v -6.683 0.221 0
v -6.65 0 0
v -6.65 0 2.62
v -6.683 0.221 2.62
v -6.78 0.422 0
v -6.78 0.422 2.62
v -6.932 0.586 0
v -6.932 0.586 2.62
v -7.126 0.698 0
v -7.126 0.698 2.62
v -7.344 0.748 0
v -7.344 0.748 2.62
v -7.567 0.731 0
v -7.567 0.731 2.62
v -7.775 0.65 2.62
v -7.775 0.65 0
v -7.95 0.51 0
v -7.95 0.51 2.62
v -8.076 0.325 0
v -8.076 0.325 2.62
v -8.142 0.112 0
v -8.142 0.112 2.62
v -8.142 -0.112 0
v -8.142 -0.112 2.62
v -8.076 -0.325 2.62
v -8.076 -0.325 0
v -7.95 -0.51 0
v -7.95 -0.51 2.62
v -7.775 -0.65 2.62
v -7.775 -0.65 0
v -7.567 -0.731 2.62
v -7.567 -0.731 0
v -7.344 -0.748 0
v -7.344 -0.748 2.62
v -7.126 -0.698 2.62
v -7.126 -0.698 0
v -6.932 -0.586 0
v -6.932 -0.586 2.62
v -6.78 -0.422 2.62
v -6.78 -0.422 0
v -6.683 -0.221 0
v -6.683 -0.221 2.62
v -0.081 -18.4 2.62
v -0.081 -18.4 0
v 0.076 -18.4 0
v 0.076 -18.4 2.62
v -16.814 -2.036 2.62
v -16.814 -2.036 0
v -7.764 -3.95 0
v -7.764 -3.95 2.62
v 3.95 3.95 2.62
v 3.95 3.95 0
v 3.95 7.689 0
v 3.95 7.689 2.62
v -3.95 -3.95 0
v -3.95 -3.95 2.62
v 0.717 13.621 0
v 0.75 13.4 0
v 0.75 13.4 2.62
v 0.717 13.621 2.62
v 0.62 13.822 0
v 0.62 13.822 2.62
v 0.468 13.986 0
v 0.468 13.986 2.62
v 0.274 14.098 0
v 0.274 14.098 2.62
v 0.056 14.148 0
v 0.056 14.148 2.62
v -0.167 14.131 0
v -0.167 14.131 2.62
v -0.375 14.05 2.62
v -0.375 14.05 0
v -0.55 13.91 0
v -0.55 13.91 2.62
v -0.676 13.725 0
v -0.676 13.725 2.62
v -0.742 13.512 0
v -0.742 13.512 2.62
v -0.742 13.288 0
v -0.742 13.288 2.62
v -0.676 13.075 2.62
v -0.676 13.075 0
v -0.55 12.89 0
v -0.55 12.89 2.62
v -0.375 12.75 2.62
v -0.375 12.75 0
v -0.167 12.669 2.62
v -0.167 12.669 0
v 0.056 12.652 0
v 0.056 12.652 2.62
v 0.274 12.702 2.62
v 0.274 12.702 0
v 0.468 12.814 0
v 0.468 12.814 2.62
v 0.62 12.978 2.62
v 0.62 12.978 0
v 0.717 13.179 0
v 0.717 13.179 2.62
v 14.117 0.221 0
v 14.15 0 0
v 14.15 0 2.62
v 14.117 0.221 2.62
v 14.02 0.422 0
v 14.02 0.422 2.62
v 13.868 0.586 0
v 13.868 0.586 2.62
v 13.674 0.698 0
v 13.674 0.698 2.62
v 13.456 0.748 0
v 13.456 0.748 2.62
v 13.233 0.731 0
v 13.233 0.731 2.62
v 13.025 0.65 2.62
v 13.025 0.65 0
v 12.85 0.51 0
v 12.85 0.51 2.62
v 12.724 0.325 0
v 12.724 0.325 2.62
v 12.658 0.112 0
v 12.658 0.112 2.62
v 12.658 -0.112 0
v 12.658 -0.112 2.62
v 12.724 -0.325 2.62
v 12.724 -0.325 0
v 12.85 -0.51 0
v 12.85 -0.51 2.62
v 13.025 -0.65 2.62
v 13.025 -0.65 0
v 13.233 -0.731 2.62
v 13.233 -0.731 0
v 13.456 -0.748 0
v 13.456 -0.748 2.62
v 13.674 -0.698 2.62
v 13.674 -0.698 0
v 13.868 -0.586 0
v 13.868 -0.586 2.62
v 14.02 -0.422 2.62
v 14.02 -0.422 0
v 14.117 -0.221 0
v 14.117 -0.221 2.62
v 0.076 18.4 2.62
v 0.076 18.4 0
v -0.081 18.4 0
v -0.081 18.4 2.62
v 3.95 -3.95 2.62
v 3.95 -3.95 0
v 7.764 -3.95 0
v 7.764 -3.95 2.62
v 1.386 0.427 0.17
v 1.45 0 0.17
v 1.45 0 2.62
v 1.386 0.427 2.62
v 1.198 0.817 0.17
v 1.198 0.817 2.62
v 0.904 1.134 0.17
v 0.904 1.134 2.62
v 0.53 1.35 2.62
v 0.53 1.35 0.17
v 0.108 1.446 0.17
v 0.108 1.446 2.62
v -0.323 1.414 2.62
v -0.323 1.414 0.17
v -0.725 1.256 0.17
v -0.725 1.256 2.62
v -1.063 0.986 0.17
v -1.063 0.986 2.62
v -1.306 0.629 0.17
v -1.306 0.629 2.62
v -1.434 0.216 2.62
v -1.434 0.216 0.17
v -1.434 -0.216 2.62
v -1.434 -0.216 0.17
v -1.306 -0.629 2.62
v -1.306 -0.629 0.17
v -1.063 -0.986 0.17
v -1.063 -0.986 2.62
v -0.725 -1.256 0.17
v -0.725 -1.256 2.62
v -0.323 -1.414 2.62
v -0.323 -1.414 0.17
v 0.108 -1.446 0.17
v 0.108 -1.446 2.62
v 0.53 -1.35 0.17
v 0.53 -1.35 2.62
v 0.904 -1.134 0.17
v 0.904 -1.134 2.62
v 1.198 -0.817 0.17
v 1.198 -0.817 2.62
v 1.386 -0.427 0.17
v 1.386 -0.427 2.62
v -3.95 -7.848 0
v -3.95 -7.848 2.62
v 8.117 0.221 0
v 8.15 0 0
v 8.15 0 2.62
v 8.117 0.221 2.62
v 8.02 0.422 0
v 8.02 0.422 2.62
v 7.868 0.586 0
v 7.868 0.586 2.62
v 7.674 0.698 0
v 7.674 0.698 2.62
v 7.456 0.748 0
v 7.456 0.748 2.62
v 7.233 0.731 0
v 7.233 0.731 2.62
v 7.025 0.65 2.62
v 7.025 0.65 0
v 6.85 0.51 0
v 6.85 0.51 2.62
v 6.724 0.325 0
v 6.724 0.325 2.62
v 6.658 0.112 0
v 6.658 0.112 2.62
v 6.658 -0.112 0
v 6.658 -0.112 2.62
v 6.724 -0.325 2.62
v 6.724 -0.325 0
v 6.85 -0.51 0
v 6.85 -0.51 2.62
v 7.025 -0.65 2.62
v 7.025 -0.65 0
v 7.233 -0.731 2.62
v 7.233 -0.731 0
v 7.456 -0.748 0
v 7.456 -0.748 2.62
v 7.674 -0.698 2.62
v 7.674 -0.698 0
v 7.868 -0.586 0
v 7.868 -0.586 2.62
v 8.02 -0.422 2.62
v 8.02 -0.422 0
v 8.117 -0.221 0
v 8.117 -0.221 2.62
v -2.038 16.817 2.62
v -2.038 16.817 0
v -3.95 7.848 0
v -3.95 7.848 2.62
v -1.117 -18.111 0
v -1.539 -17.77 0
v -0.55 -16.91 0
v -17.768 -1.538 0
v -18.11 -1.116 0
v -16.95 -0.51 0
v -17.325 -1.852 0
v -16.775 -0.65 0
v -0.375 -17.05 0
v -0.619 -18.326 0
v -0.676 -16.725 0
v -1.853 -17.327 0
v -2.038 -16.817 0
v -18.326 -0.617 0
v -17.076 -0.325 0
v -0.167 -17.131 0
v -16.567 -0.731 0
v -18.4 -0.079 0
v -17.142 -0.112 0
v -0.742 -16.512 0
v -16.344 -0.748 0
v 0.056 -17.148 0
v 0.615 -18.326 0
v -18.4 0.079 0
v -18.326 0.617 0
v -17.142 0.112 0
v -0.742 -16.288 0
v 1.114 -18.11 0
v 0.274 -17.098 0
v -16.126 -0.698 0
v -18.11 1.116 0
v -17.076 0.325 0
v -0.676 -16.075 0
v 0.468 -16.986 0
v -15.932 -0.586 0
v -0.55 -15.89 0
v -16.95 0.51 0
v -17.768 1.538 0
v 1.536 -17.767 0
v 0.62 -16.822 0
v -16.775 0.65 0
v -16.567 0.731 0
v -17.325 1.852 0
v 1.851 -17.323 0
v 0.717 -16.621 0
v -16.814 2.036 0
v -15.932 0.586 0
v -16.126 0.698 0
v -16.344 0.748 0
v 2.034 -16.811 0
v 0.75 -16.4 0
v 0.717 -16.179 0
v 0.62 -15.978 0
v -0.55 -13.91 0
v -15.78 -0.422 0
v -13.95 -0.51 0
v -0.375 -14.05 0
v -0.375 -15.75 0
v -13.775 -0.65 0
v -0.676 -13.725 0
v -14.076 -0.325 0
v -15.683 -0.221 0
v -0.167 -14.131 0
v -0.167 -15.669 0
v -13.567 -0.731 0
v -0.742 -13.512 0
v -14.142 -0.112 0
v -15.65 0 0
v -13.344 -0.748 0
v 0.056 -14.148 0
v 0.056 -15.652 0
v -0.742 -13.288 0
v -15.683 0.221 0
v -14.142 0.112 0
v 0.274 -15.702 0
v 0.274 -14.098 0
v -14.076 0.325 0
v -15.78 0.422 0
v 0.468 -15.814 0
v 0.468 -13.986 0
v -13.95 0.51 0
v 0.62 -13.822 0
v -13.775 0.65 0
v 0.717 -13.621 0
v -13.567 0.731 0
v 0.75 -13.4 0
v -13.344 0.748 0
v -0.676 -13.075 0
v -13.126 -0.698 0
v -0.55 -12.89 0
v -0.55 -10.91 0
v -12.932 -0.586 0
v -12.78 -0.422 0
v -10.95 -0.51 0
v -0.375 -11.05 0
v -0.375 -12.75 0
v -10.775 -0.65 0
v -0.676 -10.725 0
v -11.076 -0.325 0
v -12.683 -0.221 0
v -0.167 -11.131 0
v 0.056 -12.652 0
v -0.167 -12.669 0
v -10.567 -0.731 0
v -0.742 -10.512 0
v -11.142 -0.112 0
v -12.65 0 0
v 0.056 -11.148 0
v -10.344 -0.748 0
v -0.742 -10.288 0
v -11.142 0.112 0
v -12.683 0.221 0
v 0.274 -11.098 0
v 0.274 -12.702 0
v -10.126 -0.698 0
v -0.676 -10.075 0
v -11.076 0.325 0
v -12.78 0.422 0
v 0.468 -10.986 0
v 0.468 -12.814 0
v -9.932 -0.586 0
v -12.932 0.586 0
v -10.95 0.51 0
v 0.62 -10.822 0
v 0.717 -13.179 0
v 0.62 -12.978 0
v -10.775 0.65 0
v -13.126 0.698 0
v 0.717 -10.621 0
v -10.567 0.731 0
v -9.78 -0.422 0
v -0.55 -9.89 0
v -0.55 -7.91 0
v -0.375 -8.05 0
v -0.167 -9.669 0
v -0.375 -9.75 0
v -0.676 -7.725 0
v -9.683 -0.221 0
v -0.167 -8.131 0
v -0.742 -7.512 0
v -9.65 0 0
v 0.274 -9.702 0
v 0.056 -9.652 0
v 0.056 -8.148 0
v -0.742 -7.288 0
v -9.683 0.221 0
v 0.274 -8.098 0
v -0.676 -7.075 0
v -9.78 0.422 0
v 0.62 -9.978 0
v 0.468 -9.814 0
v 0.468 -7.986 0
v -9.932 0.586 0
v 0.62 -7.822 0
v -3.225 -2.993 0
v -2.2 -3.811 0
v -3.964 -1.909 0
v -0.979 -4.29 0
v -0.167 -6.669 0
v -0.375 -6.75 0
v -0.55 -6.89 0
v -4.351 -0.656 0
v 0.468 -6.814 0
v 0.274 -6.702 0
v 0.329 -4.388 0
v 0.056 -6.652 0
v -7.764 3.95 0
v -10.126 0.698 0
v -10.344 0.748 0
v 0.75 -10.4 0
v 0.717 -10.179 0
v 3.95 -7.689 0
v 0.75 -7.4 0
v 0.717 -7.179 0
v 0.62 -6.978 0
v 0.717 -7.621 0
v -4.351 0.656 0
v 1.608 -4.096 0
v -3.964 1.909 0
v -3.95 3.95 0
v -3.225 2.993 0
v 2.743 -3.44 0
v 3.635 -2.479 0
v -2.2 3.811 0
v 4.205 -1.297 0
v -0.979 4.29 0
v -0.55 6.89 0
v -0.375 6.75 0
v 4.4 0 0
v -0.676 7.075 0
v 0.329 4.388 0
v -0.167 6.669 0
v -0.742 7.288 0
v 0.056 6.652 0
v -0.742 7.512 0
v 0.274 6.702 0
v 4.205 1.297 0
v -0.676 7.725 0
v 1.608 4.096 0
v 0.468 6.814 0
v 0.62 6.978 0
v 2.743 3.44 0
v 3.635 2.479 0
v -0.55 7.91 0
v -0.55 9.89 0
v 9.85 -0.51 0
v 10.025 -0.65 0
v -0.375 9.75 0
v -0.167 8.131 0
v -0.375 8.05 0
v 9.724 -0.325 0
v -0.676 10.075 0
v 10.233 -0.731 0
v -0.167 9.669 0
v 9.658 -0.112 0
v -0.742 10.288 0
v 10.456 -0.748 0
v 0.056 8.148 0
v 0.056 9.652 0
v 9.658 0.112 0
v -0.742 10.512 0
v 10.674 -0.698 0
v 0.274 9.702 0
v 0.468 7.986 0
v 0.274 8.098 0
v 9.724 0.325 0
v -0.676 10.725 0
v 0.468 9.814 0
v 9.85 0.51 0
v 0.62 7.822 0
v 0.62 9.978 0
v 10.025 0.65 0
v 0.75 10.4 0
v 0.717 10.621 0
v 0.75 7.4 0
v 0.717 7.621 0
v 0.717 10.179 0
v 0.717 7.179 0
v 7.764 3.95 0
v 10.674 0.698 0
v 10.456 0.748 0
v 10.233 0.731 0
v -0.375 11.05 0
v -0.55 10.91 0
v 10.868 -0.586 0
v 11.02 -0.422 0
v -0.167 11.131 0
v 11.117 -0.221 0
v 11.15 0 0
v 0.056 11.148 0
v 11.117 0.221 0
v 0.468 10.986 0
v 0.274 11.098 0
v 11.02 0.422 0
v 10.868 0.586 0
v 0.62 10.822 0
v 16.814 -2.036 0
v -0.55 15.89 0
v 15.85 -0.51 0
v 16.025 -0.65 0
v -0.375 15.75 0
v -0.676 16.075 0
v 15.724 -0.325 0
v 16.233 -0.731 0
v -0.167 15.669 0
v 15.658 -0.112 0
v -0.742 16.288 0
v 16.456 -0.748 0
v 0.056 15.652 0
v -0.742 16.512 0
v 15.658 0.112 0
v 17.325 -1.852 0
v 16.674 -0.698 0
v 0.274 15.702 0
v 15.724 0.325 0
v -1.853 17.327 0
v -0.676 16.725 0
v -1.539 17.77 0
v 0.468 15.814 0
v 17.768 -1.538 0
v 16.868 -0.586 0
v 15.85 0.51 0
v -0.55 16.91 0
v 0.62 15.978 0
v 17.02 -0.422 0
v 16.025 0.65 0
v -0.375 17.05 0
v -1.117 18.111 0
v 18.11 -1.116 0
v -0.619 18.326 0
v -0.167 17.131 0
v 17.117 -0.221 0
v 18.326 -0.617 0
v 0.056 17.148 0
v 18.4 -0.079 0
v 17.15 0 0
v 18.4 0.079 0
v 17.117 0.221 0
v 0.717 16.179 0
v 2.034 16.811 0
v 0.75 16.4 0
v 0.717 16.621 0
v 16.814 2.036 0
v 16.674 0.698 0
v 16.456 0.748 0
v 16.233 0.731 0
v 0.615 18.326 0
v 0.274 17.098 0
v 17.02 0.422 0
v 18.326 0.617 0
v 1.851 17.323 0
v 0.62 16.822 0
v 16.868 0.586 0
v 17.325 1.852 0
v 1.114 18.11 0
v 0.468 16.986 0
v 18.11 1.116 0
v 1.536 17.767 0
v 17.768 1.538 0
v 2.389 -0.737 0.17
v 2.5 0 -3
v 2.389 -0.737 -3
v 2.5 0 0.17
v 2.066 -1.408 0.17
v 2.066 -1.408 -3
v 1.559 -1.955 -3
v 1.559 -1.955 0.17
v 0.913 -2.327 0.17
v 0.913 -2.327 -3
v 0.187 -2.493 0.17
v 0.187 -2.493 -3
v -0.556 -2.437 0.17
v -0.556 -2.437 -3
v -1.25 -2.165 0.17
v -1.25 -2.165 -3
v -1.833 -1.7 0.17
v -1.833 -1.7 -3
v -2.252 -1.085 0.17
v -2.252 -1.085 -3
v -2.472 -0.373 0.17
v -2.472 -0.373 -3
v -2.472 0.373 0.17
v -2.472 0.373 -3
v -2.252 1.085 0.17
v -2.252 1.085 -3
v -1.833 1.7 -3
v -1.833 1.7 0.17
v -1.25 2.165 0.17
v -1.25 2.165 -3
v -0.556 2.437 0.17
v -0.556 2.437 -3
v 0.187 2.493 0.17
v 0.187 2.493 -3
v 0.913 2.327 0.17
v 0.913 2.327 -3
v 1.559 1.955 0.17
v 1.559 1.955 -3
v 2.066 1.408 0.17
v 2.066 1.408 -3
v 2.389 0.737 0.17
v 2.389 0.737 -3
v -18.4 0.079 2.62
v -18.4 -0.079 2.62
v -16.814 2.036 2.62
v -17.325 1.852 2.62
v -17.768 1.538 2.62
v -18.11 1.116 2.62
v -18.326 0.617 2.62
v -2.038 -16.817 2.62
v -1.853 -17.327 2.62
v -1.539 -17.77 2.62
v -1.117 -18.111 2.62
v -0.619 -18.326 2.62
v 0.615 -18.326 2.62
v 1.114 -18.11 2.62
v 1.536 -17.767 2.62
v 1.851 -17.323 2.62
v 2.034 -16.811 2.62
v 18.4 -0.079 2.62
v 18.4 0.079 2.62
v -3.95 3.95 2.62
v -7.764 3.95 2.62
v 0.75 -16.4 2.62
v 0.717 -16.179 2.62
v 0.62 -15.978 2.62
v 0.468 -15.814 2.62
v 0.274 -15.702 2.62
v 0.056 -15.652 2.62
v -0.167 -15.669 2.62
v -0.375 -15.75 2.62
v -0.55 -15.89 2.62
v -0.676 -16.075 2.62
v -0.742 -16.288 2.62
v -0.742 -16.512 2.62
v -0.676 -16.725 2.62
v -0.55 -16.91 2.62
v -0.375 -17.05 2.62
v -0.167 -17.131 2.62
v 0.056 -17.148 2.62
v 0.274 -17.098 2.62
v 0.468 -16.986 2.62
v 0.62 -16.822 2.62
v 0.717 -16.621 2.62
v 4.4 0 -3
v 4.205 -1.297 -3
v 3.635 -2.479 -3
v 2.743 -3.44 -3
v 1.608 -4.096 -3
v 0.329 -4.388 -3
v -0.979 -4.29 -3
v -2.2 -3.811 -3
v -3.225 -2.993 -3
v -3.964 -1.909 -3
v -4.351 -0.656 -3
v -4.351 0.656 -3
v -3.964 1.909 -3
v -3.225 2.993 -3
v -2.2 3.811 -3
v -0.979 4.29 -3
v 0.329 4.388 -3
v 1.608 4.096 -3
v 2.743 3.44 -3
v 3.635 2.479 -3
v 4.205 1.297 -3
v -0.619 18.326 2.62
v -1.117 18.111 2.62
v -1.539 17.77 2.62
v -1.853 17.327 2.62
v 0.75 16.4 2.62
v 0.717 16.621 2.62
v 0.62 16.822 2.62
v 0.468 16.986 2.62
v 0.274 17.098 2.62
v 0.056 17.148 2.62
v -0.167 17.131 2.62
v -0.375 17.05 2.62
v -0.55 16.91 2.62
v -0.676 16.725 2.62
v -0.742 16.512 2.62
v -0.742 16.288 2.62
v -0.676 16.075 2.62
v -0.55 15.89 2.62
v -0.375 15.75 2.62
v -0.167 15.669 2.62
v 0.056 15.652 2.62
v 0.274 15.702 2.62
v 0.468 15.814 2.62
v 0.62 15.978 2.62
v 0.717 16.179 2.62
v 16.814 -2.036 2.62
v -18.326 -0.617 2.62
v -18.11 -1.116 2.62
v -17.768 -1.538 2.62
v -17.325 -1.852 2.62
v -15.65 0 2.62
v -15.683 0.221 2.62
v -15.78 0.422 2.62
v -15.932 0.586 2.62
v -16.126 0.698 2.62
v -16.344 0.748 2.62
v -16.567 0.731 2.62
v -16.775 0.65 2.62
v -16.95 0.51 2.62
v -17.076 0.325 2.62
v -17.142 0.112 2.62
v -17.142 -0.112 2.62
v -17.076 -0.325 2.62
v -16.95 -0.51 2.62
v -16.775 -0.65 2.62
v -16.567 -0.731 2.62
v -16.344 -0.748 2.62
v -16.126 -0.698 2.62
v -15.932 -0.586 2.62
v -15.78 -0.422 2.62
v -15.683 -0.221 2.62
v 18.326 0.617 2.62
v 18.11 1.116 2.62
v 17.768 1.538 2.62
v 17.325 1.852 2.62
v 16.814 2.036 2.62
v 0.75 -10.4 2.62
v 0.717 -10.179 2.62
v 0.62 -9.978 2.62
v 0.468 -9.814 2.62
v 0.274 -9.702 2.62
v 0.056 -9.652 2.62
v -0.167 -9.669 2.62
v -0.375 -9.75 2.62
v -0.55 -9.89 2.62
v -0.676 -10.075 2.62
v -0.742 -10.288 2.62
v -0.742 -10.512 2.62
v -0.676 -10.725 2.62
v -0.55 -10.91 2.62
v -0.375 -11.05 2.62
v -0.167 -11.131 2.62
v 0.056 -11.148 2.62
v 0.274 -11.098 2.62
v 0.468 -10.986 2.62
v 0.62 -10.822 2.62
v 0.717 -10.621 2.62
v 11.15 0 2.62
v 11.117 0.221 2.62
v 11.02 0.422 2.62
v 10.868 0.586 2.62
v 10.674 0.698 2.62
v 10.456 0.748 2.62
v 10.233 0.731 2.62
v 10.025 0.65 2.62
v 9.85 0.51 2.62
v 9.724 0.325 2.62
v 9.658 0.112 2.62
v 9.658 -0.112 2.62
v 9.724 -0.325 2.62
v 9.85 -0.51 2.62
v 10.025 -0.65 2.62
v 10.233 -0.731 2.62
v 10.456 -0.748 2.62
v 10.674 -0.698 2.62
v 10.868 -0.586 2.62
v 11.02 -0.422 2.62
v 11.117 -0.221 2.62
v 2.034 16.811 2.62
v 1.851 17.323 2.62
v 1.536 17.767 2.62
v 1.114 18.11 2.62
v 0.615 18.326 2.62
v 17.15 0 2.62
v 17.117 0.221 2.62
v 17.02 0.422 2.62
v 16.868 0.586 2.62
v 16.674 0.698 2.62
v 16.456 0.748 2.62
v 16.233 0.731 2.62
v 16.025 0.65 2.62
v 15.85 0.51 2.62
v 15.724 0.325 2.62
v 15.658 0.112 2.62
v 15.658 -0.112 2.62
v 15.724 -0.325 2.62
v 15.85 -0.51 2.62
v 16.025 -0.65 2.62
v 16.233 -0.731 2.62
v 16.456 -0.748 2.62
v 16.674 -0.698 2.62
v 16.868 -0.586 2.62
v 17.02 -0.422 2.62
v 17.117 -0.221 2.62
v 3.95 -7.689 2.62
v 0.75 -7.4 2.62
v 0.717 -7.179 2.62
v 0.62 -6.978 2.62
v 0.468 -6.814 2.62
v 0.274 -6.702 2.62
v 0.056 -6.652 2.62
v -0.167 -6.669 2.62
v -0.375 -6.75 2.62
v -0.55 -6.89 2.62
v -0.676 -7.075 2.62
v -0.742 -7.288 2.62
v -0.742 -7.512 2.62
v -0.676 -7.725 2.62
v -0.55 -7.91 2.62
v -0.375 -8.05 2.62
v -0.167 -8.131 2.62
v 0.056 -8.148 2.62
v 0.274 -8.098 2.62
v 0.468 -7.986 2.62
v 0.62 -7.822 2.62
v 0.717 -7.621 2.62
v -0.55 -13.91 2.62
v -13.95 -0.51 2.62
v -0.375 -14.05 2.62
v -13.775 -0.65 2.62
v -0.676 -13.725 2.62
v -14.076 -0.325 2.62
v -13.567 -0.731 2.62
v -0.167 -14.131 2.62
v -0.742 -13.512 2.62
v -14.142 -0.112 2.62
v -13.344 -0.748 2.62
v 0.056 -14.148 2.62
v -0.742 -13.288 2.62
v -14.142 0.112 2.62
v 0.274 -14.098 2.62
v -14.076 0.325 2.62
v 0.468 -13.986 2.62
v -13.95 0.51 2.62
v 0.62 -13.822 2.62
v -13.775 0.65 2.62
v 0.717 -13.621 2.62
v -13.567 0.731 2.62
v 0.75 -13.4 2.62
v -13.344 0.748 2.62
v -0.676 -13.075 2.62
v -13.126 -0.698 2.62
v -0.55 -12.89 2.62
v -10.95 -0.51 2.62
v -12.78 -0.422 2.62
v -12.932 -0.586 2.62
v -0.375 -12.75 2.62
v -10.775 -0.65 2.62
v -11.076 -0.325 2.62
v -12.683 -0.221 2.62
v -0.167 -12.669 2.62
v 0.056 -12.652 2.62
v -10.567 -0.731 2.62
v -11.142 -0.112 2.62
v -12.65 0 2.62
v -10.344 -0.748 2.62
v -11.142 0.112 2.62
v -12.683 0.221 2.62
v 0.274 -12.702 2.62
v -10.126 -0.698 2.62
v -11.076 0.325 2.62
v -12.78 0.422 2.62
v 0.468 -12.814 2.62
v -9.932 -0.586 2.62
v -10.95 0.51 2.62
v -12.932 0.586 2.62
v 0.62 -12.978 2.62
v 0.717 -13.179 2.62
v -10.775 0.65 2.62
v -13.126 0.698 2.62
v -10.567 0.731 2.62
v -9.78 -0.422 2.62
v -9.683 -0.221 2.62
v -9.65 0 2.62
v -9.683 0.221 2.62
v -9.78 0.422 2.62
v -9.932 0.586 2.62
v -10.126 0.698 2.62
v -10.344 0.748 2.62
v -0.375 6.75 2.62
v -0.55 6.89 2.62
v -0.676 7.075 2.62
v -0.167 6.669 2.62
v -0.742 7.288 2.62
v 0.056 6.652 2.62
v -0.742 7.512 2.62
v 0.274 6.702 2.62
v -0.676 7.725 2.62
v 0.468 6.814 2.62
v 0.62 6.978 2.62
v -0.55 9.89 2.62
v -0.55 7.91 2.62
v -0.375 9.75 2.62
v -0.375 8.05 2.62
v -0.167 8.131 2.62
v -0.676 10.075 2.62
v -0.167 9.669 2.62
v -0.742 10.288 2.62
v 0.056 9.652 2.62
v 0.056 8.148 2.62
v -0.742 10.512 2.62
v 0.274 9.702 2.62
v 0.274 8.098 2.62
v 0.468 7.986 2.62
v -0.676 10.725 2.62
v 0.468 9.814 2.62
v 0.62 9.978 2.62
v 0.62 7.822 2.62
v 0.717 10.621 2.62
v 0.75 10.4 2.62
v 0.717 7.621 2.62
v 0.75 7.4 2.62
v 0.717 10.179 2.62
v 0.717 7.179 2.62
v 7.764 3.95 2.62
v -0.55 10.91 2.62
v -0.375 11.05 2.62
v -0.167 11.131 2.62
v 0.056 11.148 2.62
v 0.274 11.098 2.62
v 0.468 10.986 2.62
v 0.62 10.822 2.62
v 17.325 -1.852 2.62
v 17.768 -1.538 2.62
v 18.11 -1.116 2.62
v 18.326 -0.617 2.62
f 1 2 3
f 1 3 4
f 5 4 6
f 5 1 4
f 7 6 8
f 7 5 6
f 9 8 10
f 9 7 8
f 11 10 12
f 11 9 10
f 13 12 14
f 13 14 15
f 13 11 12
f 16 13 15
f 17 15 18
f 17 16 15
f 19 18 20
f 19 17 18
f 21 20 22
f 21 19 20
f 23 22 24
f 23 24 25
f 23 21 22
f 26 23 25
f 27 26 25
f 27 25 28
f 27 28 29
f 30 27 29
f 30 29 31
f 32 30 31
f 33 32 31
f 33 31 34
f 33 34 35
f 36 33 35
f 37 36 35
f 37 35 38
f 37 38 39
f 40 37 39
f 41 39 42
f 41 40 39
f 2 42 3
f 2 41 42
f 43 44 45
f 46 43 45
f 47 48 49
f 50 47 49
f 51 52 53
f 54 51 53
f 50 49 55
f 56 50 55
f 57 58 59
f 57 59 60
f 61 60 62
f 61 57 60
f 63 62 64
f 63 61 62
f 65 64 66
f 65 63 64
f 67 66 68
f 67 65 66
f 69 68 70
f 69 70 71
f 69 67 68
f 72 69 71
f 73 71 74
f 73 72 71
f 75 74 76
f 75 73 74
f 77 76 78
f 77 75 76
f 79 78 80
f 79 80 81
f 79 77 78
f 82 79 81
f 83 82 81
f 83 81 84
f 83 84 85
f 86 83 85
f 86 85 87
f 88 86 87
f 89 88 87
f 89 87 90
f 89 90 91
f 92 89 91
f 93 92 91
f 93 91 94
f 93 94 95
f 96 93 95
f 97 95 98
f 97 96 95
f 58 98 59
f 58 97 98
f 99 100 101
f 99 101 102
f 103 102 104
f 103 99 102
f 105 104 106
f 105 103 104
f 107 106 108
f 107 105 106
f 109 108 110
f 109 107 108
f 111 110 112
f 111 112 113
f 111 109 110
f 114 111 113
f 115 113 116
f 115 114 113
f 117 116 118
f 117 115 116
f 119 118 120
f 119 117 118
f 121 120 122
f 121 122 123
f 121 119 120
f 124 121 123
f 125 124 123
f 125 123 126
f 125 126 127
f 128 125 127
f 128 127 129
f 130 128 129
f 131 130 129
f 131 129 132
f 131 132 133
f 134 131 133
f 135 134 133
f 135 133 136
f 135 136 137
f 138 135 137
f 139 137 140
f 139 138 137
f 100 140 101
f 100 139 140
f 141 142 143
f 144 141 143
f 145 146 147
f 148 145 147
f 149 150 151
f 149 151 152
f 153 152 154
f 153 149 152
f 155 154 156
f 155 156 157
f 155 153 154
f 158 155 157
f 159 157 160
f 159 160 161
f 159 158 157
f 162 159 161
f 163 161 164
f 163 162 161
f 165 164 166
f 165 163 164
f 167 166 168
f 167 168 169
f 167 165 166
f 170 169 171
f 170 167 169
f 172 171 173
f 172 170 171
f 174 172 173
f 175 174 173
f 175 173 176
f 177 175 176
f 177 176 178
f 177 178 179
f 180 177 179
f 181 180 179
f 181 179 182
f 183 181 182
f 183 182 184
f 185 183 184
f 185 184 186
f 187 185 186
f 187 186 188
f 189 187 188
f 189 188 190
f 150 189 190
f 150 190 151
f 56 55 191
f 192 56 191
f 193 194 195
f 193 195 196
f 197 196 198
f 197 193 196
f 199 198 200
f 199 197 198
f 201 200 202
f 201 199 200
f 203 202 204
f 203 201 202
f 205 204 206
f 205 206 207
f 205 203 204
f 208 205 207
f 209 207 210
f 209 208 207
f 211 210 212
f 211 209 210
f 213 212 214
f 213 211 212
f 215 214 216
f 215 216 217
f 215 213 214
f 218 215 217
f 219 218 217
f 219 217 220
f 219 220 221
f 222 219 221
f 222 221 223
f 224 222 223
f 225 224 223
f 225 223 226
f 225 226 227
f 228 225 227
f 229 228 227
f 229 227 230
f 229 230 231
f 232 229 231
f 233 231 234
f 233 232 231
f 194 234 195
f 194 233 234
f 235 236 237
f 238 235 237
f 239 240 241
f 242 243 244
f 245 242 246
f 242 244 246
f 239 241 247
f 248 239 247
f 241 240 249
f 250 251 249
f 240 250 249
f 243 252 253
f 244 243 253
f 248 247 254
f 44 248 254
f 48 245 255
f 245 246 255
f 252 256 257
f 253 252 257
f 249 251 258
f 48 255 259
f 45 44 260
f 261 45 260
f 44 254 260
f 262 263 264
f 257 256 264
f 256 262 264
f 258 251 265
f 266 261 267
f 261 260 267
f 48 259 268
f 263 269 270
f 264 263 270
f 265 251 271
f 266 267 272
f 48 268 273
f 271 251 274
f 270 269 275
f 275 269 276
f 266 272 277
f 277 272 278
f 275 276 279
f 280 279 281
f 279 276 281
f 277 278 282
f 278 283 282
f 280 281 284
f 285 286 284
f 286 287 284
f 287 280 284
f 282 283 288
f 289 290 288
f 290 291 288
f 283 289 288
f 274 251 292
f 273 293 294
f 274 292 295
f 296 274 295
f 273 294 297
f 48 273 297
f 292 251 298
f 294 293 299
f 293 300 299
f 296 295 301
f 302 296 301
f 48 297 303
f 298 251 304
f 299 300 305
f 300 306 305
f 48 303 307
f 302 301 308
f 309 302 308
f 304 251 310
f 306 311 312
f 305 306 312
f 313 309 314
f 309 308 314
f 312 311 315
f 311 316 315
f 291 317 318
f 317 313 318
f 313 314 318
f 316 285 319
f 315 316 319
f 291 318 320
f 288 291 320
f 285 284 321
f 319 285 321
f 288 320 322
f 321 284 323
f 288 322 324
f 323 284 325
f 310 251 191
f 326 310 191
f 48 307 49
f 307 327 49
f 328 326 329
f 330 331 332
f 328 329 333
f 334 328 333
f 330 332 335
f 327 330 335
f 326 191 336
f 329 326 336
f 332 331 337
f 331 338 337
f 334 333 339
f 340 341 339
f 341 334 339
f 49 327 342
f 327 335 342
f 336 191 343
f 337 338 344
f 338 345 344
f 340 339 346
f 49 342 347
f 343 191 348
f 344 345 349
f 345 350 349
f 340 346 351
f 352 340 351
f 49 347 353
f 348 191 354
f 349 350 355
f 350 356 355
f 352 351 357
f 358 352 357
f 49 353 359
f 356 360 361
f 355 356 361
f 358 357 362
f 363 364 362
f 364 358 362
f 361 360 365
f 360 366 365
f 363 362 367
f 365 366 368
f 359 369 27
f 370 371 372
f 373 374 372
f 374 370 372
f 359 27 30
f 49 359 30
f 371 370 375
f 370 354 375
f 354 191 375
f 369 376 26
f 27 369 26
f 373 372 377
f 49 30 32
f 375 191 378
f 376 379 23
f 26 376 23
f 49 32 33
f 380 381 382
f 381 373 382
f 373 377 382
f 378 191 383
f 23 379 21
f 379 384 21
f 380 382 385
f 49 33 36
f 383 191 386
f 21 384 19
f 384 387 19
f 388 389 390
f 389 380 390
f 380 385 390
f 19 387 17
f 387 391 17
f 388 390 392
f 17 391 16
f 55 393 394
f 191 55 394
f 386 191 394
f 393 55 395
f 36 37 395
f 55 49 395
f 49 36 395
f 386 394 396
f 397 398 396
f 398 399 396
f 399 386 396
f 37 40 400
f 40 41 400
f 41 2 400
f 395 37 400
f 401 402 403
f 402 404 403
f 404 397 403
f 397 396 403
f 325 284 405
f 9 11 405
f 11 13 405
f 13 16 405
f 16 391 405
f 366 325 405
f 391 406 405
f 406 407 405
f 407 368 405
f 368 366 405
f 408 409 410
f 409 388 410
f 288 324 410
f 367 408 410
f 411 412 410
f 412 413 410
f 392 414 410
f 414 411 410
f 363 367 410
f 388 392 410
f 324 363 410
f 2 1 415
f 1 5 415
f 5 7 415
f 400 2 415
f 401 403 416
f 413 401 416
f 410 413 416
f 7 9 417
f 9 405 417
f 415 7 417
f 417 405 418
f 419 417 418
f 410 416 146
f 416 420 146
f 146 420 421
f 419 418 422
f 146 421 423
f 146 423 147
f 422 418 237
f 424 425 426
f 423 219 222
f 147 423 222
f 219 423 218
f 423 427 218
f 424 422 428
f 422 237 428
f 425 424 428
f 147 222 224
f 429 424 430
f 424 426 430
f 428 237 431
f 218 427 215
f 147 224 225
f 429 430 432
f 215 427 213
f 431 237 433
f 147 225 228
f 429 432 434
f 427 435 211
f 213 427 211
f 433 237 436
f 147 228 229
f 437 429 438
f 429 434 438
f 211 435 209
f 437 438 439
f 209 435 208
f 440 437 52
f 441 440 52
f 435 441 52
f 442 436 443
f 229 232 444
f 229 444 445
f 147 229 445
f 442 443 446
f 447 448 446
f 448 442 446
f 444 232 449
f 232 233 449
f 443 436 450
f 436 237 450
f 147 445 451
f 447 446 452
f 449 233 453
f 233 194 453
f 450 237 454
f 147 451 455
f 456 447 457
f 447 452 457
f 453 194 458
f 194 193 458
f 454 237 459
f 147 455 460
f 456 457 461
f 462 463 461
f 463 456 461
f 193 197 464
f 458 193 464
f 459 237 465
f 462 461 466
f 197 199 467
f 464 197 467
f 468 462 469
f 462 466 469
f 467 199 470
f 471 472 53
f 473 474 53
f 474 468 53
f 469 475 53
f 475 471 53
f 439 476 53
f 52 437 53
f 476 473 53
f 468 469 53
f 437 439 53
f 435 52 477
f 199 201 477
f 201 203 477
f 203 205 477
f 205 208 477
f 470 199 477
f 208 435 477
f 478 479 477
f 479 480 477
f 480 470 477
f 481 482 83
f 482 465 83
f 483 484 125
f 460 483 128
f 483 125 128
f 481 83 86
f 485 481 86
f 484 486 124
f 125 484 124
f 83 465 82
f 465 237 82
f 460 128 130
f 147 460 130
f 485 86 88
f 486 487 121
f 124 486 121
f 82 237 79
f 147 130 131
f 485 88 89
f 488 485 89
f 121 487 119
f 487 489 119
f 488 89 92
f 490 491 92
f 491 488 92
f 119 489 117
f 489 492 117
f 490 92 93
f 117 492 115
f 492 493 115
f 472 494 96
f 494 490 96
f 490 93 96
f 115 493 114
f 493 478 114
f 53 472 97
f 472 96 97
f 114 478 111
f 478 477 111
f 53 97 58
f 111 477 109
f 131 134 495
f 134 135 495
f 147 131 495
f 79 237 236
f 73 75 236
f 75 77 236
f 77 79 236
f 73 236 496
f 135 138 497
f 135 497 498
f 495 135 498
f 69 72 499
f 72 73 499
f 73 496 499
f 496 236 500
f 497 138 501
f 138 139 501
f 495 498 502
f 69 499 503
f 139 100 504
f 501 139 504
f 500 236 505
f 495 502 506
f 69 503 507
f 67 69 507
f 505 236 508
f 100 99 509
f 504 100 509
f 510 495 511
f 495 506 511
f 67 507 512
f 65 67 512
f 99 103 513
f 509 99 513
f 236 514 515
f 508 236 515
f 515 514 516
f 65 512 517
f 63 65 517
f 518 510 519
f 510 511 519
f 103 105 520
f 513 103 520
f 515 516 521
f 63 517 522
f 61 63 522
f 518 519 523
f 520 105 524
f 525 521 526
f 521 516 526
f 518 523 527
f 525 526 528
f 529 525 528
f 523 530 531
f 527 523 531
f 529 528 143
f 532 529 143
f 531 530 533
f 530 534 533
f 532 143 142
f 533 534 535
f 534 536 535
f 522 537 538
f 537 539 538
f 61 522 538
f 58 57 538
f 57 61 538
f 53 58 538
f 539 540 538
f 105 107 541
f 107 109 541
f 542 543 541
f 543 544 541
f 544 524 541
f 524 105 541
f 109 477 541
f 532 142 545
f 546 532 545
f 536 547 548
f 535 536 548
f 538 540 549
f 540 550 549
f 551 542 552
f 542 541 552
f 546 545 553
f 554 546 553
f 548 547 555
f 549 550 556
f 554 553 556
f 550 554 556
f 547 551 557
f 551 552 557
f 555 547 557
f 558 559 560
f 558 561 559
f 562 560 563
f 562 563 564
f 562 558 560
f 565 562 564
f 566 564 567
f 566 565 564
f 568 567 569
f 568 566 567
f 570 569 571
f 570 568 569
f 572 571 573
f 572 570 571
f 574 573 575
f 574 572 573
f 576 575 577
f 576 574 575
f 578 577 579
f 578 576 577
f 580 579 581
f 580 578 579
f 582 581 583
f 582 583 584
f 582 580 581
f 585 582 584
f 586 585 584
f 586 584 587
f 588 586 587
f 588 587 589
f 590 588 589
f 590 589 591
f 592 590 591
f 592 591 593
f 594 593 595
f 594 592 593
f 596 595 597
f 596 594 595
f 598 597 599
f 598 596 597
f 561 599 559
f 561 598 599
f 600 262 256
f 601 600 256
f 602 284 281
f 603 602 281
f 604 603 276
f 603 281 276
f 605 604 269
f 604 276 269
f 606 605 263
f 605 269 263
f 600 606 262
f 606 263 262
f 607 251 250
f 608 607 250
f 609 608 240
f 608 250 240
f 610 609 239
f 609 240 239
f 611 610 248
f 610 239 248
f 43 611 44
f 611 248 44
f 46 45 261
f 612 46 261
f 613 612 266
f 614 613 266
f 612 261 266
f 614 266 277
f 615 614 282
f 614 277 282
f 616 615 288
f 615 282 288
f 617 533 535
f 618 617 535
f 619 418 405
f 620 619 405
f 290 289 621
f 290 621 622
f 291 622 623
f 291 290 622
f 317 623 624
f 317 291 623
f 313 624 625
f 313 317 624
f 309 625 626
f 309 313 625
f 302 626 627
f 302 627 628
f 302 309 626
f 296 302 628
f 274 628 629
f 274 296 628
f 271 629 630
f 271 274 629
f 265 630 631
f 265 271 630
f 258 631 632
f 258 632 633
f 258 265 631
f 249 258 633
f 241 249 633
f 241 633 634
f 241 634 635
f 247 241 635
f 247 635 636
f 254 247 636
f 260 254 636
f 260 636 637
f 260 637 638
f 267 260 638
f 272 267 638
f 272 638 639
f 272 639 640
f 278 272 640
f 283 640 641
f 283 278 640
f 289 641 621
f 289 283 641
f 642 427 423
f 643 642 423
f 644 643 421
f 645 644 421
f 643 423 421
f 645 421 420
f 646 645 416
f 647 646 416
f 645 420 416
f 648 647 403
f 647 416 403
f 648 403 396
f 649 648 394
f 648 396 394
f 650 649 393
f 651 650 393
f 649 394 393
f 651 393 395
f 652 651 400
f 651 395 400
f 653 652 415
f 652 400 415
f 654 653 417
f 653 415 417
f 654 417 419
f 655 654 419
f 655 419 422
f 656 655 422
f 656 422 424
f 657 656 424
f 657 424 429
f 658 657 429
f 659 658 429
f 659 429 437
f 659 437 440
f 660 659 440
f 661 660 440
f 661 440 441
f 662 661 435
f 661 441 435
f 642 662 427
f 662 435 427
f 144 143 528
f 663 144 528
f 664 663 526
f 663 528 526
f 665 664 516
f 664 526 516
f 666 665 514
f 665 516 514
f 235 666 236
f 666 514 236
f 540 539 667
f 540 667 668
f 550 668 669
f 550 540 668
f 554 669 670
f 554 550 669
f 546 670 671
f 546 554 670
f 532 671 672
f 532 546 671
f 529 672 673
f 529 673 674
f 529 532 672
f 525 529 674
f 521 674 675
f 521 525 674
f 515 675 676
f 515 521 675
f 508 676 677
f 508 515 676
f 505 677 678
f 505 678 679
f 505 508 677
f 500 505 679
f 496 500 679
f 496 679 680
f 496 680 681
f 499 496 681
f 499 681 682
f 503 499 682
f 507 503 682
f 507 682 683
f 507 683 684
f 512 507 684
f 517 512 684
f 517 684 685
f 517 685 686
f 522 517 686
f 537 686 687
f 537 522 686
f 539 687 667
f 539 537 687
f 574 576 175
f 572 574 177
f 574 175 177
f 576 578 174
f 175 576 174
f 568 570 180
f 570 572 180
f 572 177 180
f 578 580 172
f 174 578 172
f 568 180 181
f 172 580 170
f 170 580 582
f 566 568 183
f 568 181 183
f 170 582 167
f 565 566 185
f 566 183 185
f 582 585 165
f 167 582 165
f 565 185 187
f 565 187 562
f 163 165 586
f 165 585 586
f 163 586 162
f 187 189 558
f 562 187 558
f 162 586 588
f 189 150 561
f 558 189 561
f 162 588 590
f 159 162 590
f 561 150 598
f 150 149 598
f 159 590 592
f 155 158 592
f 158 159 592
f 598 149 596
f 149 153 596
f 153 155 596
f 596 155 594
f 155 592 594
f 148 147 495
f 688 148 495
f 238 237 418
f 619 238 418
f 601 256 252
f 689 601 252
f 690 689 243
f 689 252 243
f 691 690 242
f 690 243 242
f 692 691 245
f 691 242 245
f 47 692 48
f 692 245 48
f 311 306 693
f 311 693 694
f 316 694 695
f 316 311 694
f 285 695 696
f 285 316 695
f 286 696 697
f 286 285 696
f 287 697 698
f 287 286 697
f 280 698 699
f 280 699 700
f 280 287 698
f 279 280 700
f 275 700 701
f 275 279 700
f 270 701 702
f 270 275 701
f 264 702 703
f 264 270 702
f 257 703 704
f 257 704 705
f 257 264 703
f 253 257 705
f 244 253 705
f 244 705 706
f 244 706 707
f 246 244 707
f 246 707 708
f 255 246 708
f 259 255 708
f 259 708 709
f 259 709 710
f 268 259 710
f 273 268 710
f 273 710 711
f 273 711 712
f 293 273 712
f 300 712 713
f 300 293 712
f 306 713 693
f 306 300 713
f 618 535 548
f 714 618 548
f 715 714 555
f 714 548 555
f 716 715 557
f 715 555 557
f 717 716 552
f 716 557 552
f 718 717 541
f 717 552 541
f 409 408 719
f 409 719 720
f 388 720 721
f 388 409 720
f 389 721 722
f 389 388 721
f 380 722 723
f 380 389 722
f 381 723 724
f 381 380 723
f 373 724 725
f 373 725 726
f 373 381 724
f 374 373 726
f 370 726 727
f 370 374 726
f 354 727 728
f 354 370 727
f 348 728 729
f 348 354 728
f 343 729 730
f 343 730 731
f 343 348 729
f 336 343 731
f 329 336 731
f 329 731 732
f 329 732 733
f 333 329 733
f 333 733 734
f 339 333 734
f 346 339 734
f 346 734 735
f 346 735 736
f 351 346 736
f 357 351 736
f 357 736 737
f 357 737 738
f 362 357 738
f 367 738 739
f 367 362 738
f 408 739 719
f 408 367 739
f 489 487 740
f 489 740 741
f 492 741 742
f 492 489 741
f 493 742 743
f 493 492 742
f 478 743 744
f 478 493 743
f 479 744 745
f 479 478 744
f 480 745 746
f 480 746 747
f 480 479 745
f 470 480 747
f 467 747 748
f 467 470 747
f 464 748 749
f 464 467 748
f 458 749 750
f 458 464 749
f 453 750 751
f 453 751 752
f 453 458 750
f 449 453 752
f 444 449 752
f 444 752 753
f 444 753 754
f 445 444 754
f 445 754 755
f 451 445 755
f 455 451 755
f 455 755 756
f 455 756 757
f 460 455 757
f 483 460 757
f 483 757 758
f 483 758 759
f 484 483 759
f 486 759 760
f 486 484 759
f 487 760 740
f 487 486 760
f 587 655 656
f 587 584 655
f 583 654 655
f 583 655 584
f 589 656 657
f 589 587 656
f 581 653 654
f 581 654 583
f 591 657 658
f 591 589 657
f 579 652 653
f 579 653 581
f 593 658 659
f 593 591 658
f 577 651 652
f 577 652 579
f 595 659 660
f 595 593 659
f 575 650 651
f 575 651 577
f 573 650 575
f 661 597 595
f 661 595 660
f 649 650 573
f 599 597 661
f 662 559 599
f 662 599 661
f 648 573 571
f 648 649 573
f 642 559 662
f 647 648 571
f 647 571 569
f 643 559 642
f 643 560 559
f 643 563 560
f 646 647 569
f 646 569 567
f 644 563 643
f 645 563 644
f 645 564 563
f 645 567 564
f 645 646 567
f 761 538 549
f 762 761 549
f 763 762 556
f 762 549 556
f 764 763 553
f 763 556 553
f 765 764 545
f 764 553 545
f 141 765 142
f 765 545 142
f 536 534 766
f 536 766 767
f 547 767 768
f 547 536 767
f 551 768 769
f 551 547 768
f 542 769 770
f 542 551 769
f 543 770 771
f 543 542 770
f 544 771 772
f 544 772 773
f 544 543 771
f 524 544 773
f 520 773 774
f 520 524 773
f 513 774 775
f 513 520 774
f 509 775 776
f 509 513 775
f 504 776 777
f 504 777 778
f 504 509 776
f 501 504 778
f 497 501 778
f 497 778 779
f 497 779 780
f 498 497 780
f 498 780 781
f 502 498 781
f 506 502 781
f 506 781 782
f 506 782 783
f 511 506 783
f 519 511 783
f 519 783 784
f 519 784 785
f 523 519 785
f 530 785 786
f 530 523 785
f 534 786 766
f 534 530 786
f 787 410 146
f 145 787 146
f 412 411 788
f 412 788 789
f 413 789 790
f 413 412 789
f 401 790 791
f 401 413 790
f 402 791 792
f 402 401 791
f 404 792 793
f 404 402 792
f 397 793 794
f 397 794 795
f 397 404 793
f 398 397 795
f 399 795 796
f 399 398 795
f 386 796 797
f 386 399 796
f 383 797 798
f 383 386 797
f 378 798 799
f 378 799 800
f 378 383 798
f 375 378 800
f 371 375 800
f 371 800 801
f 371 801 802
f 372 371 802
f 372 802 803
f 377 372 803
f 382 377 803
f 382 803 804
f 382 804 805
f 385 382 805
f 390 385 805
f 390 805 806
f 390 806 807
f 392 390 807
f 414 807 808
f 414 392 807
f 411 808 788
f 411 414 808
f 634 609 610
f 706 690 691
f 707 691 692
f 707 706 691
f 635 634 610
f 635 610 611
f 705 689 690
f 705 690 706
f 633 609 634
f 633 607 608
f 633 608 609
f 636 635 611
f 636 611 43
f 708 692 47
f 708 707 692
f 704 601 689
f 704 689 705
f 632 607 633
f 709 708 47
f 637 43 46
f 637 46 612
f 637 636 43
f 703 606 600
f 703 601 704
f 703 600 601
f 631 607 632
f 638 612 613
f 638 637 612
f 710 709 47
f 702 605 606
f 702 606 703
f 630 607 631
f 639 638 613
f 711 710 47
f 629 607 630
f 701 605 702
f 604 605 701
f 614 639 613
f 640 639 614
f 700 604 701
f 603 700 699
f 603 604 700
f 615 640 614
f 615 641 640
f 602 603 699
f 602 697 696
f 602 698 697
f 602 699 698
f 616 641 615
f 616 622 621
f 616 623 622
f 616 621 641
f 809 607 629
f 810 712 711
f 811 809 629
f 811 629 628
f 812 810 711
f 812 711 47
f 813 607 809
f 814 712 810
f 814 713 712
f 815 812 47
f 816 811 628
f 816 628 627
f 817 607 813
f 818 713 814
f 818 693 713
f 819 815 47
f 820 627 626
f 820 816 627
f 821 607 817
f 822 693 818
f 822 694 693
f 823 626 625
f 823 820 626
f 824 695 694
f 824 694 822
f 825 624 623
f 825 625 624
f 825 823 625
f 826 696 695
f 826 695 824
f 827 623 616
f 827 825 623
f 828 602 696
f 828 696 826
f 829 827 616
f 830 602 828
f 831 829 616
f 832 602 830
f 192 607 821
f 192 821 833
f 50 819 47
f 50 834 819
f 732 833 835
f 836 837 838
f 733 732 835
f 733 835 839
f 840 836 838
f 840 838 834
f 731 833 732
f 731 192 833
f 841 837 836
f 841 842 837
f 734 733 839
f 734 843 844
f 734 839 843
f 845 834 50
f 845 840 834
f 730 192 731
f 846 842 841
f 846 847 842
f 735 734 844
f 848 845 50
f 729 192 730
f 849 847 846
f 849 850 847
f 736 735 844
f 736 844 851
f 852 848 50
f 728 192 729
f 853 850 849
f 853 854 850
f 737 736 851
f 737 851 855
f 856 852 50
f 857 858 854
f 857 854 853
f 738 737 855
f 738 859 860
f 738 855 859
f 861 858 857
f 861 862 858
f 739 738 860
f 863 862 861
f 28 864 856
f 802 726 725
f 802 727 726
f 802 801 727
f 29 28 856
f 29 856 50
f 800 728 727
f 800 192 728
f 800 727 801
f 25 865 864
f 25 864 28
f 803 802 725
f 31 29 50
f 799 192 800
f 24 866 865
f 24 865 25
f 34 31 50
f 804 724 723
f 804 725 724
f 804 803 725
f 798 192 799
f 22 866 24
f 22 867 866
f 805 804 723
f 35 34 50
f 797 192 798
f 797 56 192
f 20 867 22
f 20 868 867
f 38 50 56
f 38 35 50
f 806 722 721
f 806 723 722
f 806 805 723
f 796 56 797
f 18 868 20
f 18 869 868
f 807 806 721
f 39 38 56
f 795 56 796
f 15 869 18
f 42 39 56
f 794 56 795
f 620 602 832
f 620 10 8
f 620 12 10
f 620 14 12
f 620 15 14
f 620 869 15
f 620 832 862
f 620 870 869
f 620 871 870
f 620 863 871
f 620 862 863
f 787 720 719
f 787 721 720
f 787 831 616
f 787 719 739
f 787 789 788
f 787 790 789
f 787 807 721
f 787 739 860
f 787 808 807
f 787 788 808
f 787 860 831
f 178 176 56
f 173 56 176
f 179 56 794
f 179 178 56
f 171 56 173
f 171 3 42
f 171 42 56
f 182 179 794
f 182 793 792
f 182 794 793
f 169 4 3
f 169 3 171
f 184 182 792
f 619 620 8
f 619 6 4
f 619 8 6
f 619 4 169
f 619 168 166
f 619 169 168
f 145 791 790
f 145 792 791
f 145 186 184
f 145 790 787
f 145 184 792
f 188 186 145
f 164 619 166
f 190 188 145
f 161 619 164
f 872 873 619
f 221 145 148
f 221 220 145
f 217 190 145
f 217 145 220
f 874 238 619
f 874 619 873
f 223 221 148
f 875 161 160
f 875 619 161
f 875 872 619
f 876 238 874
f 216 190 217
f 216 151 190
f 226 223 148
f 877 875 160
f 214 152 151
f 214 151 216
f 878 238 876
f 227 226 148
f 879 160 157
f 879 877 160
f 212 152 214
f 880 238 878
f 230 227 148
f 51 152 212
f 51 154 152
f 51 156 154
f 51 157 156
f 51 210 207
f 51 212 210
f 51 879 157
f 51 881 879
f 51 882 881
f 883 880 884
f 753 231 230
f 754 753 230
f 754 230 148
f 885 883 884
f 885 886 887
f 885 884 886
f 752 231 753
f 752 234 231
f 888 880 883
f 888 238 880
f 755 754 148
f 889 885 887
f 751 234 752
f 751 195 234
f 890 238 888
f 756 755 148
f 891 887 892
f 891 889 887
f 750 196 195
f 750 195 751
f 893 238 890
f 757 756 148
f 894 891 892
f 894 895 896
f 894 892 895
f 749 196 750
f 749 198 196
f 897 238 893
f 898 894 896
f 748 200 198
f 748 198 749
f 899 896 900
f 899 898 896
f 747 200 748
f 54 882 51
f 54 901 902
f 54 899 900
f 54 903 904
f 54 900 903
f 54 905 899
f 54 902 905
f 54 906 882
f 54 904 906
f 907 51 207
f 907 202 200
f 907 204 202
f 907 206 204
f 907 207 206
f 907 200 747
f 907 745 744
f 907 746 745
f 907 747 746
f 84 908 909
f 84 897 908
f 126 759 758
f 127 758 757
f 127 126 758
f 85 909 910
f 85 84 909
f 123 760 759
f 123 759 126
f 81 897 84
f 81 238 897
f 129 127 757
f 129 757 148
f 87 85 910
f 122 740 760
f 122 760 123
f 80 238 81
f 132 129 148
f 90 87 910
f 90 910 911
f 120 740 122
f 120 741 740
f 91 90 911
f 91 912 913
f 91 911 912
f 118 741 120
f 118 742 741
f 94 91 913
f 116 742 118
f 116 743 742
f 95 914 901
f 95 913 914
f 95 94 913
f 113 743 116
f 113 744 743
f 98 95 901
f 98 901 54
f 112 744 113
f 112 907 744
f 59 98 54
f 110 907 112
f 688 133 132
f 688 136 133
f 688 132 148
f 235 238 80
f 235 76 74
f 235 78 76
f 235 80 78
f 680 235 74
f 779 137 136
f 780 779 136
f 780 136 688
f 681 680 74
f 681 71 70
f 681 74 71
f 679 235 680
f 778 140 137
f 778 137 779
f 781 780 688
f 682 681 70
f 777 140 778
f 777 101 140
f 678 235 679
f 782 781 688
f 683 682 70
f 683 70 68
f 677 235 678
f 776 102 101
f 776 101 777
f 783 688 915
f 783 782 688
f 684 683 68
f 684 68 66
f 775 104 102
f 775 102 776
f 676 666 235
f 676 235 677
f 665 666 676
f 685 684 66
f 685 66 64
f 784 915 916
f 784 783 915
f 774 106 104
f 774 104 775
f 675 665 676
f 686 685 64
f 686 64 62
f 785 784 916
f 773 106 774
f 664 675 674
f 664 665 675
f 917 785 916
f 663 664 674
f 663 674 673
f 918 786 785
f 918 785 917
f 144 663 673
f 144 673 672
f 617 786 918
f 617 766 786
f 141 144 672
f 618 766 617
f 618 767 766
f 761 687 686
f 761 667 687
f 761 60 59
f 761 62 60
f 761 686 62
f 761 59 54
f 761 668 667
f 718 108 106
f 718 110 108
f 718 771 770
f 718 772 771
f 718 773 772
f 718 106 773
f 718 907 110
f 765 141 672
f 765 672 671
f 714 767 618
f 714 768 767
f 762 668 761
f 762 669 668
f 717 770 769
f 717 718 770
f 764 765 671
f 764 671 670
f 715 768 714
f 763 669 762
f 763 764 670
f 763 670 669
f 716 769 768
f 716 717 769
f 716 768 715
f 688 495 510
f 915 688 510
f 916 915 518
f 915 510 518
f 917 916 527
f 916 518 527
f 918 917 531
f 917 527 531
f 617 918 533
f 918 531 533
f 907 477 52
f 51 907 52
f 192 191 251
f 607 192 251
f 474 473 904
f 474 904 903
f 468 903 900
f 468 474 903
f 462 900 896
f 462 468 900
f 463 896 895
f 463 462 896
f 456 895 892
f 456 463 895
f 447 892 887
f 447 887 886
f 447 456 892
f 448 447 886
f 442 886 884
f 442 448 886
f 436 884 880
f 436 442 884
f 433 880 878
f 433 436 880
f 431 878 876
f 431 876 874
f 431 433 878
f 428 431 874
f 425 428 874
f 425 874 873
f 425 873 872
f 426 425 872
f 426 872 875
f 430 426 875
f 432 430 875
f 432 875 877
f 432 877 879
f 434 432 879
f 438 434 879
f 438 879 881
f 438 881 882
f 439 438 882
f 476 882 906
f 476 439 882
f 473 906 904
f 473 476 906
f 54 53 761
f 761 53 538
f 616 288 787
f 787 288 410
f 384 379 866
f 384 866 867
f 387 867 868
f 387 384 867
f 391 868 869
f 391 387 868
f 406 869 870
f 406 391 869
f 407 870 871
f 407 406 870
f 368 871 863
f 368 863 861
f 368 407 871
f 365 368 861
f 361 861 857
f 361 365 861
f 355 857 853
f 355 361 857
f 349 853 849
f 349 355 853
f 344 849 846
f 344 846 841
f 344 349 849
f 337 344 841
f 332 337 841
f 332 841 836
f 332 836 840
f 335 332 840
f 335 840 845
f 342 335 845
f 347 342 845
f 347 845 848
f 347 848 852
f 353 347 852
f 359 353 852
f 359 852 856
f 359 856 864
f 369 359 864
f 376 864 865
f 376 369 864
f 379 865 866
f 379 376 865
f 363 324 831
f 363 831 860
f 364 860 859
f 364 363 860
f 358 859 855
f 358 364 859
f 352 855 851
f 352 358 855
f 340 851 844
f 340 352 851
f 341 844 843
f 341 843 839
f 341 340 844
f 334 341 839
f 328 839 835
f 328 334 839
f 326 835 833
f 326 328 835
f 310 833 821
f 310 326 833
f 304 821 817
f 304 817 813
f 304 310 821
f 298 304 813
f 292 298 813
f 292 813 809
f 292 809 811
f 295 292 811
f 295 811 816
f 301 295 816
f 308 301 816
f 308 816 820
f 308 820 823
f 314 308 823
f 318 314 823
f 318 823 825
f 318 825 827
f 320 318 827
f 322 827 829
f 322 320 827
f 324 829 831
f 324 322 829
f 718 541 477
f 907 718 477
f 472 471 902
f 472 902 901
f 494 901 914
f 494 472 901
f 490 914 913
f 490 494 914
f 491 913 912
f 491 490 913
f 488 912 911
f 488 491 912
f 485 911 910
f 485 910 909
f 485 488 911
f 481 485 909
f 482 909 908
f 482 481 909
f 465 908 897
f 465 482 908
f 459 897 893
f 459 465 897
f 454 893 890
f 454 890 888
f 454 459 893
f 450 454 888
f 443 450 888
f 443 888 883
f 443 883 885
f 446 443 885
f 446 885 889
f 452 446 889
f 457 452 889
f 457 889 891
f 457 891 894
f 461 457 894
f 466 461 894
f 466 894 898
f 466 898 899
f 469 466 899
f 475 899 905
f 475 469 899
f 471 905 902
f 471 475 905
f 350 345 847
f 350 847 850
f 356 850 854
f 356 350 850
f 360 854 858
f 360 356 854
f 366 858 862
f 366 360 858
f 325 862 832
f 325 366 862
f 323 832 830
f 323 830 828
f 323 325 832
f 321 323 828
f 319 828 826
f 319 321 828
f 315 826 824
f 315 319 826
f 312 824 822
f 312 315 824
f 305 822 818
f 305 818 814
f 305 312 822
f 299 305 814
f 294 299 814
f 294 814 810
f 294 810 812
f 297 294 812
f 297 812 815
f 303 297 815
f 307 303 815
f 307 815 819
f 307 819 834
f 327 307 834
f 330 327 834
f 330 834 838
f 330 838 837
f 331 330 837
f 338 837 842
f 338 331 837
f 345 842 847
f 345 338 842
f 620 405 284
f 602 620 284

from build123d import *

# Parameters (mm, degrees)
F0_R     = 0.75
F0_R_2   = 1.45
F1_DEPTH = 2.62
F2_R     = 4.4
F2_R_2   = 2.5
F3_DEPTH = 3
F4_DEPTH = 0.17


with BuildPart() as f1:
    # F0 (on Top) → F1 (new body)
    with BuildSketch(Plane.XY):
        with BuildLine():
            Line((3.95, -3.95), (7.7637545764, -3.95))
            Line((7.7637545764, -3.95), (16.8139215854, -2.0355203167))
            ThreePointArc((16.8139215854, -2.0355203167), (17.9536800138, -1.3382178935), (18.4, -0.0788218419))
            Line((18.4, -0.0788218419), (18.4, 0.0788218419))
            ThreePointArc((18.4, 0.0788218419), (17.9536800138, 1.3382178935), (16.8139215854, 2.0355203167))
            Line((16.8139215854, 2.0355203167), (7.7637545764, 3.95))
            Line((7.7637545764, 3.95), (3.95, 3.95))
            Line((3.95, 3.95), (3.95, 7.6887742616))
            Line((3.95, 7.6887742616), (2.033754464, 16.8111469309))
            ThreePointArc((2.033754464, 16.8111469309), (1.3369682429, 17.9527868273), (0.0764710913, 18.4))
            Line((0.0764710913, 18.4), (-0.0814896041, 18.4))
            ThreePointArc((-0.0814896041, 18.4), (-1.3396337634, 17.9546939488), (-2.0375187153, 16.8170732745))
            Line((-2.0375187153, 16.8170732745), (-3.95, 7.8477403149))
            Line((-3.95, 7.8477403149), (-3.95, 3.95))
            Line((-3.95, 3.95), (-7.7637545764, 3.95))
            Line((-7.7637545764, 3.95), (-16.8139215854, 2.0355203167))
            ThreePointArc((-16.8139215854, 2.0355203167), (-17.9536800138, 1.3382178935), (-18.4, 0.0788218419))
            Line((-18.4, 0.0788218419), (-18.4, -0.0788218419))
            ThreePointArc((-18.4, -0.0788218419), (-17.9536800138, -1.3382178935), (-16.8139215854, -2.0355203167))
            Line((-16.8139215854, -2.0355203167), (-7.7637545764, -3.95))
            Line((-7.7637545764, -3.95), (-3.95, -3.95))
            Line((-3.95, -3.95), (-3.95, -7.8477403149))
            Line((-3.95, -7.8477403149), (-2.0375187153, -16.8170732745))
            ThreePointArc((-2.0375187153, -16.8170732745), (-1.3396337634, -17.9546939488), (-0.0814896041, -18.4))
            Line((-0.0814896041, -18.4), (0.0764710913, -18.4))
            ThreePointArc((0.0764710913, -18.4), (1.3369682429, -17.9527868273), (2.033754464, -16.8111469309))
            Line((2.033754464, -16.8111469309), (3.95, -7.6887742616))
            Line((3.95, -7.6887742616), (3.95, -3.95))
        make_face()
        with Locations((0, -16.4)):
            Circle(F0_R, mode=Mode.SUBTRACT)
        with Locations((0, -13.4)):
            Circle(F0_R, mode=Mode.SUBTRACT)
        with Locations((0, -10.4)):
            Circle(F0_R, mode=Mode.SUBTRACT)
        with Locations((0, -7.4)):
            Circle(F0_R, mode=Mode.SUBTRACT)
        with Locations((-16.4, 0)):
            Circle(F0_R, mode=Mode.SUBTRACT)
        with Locations((-13.4, 0)):
            Circle(F0_R, mode=Mode.SUBTRACT)
        with Locations((-10.4, 0)):
            Circle(F0_R, mode=Mode.SUBTRACT)
        with Locations((-7.4, 0)):
            Circle(F0_R, mode=Mode.SUBTRACT)
        Circle(F0_R_2, mode=Mode.SUBTRACT)
        with Locations((7.4, 0)):
            Circle(F0_R, mode=Mode.SUBTRACT)
        with Locations((0, 7.4)):
            Circle(F0_R, mode=Mode.SUBTRACT)
        with Locations((10.4, 0)):
            Circle(F0_R, mode=Mode.SUBTRACT)
        with Locations((13.4, 0)):
            Circle(F0_R, mode=Mode.SUBTRACT)
        with Locations((16.4, 0)):
            Circle(F0_R, mode=Mode.SUBTRACT)
        with Locations((0, 10.4)):
            Circle(F0_R, mode=Mode.SUBTRACT)
        with Locations((0, 13.4)):
            Circle(F0_R, mode=Mode.SUBTRACT)
        with Locations((0, 16.4)):
            Circle(F0_R, mode=Mode.SUBTRACT)
    extrude(amount=F1_DEPTH)

    # F2 (on face) → F3 (join)
    with BuildSketch(Plane(origin=(0, 0, 0), x_dir=(1, 0, 0), z_dir=(0, 0, -1))):
        Circle(F2_R)
        Circle(F2_R_2, mode=Mode.SUBTRACT)
    extrude(amount=F3_DEPTH)

    # F4 (cut): a face of the model
    f4_faces = [f1.faces().sort_by_distance(p)[0] for p in [
        (-2.4292893219, 0, 0),
    ]]
    extrude(f4_faces, amount=-F4_DEPTH, mode=Mode.SUBTRACT)


solid = f1.part
